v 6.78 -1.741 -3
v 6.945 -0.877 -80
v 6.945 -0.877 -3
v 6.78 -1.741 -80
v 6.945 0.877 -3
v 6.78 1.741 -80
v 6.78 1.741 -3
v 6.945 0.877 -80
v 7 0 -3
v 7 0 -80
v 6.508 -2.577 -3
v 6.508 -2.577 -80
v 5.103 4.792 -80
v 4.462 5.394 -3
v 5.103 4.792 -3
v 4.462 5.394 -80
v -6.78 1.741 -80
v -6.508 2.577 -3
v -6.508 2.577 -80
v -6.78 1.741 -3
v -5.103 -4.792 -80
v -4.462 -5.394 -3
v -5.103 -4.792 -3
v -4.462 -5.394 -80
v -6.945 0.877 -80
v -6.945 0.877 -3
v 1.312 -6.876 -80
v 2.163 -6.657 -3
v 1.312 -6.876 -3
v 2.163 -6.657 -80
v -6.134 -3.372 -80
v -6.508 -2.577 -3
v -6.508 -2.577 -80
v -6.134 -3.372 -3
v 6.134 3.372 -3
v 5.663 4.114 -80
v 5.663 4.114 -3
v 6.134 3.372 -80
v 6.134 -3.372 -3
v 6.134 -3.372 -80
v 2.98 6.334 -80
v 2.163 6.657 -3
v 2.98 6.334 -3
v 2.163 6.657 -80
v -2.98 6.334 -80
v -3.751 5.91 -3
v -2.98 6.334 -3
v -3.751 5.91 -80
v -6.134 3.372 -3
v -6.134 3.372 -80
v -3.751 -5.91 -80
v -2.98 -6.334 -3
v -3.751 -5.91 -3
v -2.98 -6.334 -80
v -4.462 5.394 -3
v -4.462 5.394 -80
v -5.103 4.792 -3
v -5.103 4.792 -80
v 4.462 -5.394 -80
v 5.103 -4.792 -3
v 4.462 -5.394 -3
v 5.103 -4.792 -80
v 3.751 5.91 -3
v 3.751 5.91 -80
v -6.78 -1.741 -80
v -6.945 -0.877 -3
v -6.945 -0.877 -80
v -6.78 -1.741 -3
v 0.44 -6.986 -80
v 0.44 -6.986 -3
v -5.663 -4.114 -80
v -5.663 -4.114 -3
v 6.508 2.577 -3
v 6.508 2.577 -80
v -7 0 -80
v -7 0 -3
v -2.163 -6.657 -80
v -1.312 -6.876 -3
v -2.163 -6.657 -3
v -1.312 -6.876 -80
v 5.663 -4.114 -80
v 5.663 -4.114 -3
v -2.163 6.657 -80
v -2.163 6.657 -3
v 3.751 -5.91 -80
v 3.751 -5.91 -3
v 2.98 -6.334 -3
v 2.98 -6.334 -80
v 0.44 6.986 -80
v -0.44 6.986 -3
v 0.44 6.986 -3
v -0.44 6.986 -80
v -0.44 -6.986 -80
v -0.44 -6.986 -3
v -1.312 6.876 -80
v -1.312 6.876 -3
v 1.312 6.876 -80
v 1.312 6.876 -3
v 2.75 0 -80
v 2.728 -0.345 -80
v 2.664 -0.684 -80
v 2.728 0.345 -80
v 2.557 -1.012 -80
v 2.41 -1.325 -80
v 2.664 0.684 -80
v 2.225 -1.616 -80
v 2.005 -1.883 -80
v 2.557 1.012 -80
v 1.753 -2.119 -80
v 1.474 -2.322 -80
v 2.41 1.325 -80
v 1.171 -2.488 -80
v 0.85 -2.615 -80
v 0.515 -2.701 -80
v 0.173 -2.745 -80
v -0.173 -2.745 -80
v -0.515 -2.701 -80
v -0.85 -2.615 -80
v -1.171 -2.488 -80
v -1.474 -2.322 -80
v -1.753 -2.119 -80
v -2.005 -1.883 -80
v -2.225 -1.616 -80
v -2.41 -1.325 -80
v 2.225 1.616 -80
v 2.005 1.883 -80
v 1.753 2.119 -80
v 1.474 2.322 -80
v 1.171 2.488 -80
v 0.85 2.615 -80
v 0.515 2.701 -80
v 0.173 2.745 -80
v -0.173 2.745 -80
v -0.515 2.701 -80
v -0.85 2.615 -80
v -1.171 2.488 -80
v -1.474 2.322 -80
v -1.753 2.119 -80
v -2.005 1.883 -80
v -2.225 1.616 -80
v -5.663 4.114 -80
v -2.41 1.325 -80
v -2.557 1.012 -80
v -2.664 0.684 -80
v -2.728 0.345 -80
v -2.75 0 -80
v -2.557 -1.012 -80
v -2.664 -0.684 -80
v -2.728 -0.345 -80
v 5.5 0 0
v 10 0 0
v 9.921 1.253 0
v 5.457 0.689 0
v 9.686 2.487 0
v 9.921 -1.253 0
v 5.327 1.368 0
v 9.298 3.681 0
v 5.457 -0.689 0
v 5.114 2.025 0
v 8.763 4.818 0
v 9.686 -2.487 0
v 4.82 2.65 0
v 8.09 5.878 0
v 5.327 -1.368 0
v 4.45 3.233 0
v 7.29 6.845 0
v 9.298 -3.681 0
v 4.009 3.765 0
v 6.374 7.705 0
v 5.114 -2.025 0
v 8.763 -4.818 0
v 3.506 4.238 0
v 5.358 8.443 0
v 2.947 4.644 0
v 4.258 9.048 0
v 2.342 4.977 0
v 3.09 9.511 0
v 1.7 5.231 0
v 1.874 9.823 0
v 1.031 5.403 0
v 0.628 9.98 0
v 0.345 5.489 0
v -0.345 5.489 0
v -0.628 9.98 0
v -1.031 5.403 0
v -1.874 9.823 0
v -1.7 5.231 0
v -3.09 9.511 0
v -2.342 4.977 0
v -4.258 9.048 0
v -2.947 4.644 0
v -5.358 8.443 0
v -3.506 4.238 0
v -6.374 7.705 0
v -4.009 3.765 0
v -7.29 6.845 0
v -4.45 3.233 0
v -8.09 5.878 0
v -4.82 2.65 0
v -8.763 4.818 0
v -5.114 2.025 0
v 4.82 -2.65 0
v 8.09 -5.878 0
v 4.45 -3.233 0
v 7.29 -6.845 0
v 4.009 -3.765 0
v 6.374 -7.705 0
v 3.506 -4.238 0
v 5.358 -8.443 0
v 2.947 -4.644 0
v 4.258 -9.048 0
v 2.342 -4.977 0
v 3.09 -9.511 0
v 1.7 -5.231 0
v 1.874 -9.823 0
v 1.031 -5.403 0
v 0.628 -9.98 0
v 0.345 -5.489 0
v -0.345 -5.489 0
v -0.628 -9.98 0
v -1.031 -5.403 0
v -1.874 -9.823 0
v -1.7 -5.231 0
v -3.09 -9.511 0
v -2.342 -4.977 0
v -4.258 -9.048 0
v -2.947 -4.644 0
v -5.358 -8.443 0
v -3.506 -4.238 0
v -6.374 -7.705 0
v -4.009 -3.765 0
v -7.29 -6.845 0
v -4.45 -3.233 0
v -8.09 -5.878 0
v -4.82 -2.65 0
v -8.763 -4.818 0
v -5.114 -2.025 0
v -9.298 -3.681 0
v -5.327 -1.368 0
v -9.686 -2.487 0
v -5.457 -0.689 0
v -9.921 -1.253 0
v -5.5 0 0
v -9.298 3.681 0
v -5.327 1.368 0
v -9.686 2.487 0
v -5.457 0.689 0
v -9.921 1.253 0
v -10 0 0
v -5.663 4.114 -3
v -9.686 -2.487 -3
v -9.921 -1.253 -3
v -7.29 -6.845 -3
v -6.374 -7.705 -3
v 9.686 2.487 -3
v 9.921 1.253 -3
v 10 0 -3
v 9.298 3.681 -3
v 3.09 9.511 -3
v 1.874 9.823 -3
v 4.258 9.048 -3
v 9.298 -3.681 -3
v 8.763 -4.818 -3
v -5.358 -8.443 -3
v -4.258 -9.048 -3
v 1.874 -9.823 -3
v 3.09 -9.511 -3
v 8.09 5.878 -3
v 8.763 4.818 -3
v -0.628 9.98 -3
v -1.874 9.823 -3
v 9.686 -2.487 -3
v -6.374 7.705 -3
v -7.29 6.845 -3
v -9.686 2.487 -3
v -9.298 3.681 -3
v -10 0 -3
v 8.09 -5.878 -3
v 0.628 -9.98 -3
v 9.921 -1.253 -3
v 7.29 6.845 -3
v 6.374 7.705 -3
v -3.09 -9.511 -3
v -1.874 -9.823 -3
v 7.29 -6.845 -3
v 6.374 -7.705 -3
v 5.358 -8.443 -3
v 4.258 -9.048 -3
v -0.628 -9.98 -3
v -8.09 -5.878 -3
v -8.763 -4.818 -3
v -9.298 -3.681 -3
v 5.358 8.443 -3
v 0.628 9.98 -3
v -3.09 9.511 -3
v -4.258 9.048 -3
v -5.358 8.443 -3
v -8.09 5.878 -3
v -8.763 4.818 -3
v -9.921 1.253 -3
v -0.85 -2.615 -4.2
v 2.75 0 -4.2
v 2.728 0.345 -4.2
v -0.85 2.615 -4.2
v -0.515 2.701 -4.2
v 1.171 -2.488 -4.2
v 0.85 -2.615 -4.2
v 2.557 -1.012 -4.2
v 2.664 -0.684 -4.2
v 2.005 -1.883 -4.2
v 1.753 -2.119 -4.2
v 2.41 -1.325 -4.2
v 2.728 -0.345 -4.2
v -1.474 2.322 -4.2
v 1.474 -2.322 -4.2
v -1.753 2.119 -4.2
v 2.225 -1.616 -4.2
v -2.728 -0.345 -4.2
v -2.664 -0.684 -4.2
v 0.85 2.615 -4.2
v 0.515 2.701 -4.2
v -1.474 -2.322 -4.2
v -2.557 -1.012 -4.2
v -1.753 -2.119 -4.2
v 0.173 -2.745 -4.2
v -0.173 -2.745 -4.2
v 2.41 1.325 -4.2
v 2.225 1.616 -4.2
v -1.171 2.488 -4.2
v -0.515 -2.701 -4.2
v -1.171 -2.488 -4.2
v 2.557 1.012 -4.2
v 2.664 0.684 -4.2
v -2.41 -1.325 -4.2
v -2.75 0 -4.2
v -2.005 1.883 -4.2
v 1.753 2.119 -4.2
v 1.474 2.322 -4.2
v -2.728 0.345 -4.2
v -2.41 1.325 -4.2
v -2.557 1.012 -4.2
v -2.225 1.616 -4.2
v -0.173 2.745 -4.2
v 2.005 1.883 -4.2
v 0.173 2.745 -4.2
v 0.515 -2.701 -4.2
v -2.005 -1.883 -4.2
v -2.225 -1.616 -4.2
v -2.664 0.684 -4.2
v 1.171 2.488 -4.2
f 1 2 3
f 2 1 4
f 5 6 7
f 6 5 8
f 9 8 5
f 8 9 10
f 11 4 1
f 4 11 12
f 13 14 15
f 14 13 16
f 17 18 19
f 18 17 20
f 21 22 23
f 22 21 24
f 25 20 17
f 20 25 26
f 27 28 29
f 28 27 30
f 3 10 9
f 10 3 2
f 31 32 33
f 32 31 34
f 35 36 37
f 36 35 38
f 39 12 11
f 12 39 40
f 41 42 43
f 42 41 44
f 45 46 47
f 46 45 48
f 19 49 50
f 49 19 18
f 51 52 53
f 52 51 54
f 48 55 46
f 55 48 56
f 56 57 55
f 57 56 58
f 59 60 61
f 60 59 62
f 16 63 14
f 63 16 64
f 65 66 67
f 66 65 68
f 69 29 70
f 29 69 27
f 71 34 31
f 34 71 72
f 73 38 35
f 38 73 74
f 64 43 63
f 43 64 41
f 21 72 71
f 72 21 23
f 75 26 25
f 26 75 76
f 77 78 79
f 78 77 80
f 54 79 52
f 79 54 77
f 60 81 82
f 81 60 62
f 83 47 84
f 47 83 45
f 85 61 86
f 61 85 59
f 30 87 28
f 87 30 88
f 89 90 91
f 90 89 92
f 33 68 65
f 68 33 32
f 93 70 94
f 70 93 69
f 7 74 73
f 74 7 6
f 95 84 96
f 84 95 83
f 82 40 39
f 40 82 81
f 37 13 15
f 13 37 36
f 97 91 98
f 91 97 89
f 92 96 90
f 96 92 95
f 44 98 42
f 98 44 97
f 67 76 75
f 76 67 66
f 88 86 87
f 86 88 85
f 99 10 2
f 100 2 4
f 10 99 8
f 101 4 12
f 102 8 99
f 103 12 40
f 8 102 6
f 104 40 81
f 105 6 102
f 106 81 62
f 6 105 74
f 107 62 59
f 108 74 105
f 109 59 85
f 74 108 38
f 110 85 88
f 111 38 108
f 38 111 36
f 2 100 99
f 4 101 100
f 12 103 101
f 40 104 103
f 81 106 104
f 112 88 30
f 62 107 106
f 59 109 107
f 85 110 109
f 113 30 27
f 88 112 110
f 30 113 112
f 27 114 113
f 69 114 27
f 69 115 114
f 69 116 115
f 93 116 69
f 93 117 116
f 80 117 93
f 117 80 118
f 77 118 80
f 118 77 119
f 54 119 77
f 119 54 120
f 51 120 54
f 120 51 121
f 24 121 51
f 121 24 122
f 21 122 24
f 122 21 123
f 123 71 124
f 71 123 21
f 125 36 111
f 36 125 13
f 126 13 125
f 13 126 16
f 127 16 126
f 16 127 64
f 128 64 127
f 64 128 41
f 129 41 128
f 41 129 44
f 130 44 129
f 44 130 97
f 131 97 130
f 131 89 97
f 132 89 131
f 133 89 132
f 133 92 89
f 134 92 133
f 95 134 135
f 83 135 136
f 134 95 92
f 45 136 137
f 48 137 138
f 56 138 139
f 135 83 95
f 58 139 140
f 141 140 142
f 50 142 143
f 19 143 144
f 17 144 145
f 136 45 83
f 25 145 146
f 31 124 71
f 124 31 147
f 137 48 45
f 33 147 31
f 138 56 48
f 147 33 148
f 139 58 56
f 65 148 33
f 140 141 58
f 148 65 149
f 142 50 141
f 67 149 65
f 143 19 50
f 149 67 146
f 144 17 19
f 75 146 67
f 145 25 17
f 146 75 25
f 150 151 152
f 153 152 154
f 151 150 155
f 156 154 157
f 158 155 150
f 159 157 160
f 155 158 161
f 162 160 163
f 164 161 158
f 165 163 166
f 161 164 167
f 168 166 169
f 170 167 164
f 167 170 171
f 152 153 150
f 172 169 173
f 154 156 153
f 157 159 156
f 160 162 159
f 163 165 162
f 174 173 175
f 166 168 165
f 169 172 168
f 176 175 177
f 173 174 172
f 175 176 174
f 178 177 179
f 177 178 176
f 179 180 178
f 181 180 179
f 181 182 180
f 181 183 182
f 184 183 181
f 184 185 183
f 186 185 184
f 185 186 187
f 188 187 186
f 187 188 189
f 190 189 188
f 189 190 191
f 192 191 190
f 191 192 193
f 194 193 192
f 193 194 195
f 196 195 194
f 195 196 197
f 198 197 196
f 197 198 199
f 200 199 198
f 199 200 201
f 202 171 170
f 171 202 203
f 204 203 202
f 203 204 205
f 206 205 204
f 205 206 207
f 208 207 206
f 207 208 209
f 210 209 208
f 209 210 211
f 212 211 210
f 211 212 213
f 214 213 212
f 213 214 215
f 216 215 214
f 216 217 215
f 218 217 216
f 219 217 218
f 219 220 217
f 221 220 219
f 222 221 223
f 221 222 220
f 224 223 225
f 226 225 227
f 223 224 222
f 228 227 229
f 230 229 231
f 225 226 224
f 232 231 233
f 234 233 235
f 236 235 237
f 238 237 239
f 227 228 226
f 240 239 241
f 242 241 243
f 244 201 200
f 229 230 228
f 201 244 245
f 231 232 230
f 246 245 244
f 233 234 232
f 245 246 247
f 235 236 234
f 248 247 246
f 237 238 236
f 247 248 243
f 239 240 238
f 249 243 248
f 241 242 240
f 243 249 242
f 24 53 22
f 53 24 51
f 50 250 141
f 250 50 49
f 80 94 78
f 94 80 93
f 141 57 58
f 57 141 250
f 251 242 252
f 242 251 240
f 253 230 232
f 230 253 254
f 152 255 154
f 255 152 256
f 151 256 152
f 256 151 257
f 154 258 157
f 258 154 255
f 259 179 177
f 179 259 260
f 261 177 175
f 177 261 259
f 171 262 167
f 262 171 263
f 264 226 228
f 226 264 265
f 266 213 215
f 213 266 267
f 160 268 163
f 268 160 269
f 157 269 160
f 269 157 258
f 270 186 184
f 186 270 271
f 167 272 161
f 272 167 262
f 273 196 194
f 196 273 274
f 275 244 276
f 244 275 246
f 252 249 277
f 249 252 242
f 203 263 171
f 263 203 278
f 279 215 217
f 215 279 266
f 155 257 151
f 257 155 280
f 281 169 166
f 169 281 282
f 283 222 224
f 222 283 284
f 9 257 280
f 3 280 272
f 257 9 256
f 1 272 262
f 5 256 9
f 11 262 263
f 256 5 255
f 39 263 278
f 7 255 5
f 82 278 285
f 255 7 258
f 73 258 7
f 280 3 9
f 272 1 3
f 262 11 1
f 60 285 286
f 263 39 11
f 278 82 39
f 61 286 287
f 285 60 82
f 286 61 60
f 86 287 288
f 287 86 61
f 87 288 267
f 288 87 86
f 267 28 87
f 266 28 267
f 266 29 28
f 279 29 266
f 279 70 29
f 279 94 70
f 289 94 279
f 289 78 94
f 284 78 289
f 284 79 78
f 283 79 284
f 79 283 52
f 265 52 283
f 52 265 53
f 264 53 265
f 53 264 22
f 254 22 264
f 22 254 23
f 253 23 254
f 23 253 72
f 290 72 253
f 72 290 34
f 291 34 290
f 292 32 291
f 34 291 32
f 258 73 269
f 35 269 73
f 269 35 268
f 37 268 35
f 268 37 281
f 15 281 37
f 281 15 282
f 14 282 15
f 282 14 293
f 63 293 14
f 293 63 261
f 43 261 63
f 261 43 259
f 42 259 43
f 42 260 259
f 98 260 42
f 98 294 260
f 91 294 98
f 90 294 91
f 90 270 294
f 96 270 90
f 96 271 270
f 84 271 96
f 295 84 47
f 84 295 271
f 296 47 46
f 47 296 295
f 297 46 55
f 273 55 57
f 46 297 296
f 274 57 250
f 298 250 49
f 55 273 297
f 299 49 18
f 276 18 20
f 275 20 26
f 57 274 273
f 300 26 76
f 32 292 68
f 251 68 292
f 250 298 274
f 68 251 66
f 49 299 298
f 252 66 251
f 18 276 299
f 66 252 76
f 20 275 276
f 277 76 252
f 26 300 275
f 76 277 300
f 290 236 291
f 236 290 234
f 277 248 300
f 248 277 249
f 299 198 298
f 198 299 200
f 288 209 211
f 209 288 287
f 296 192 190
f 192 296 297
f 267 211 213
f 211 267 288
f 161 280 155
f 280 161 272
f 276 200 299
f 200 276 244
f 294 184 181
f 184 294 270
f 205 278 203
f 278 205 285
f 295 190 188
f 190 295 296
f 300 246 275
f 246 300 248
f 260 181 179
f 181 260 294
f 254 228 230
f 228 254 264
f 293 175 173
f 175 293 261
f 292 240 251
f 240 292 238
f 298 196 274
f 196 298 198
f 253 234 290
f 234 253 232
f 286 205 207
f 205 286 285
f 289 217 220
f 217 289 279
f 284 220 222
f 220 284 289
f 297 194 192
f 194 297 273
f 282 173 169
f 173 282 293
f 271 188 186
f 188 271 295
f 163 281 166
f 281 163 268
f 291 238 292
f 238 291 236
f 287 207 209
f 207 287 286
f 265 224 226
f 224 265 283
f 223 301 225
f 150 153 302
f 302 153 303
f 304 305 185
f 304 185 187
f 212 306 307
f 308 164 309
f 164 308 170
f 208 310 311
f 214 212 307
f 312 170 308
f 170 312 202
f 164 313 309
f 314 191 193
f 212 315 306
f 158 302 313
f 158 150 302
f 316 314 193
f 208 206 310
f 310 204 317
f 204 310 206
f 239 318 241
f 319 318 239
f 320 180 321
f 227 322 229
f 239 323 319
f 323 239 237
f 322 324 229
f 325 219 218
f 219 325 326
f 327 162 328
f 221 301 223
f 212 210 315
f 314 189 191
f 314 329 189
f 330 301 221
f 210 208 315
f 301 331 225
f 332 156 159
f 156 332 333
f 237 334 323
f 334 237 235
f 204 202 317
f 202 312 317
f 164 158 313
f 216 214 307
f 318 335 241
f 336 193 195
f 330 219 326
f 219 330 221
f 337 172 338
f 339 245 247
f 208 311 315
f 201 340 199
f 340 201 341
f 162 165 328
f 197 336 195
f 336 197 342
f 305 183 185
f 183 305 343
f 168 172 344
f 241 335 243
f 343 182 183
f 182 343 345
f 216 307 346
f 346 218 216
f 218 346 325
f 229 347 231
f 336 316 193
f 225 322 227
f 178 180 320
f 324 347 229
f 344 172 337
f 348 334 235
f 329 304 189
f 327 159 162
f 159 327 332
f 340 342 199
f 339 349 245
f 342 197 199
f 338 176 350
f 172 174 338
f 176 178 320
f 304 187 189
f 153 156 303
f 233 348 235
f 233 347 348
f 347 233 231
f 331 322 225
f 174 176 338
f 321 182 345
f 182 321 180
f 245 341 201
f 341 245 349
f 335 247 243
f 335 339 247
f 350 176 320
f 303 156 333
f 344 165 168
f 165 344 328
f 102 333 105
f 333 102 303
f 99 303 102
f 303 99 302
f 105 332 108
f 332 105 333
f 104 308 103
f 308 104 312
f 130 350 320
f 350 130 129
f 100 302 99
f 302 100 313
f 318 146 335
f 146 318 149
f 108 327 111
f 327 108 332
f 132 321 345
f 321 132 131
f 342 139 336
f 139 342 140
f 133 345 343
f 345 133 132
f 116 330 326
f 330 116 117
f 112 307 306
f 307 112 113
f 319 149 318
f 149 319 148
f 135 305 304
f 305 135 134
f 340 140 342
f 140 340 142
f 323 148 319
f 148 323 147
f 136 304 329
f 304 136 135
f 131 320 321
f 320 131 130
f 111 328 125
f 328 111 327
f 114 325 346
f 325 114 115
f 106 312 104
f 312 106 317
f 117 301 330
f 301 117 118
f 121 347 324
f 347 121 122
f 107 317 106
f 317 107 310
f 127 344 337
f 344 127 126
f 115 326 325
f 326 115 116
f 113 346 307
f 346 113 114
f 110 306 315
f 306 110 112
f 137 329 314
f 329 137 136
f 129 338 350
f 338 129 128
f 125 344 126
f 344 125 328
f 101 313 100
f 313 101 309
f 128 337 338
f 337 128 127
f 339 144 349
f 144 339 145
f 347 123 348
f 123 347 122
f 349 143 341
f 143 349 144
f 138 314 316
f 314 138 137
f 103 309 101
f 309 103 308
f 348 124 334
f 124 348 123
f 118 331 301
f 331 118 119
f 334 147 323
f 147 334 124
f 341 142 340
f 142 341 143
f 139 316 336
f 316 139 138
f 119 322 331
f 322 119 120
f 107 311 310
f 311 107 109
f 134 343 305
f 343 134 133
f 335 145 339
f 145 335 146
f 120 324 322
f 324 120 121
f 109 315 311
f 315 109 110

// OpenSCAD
$fn = 50;


difference() {
	union() {
		translate(v = [0, 0, -80.0000000000]) {
			cylinder(h = 80, r = 7.0000000000);
		}
		translate(v = [0, 0, -3.0000000000]) {
			cylinder(h = 3, r = 10.0000000000);
		}
	}
	union() {
		translate(v = [0, 0, 0]) {
			rotate(a = [0, 0, 0]) {
				difference() {
					union() {
						#translate(v = [0, 0, -80.0000000000]) {
							cylinder(h = 80, r = 2.2500000000);
						}
						#translate(v = [0, 0, -4.2000000000]) {
							cylinder(h = 4.2000000000, r = 7.0000000000, r1 = 2.7500000000, r2 = 5.5000000000);
						}
						#translate(v = [0, 0, -80.0000000000]) {
							cylinder(h = 80, r = 2.7500000000);
						}
						#translate(v = [0, 0, -80.0000000000]) {
							cylinder(h = 80, r = 2.2500000000);
						}
					}
					union();
				}
			}
		}
	}
}
